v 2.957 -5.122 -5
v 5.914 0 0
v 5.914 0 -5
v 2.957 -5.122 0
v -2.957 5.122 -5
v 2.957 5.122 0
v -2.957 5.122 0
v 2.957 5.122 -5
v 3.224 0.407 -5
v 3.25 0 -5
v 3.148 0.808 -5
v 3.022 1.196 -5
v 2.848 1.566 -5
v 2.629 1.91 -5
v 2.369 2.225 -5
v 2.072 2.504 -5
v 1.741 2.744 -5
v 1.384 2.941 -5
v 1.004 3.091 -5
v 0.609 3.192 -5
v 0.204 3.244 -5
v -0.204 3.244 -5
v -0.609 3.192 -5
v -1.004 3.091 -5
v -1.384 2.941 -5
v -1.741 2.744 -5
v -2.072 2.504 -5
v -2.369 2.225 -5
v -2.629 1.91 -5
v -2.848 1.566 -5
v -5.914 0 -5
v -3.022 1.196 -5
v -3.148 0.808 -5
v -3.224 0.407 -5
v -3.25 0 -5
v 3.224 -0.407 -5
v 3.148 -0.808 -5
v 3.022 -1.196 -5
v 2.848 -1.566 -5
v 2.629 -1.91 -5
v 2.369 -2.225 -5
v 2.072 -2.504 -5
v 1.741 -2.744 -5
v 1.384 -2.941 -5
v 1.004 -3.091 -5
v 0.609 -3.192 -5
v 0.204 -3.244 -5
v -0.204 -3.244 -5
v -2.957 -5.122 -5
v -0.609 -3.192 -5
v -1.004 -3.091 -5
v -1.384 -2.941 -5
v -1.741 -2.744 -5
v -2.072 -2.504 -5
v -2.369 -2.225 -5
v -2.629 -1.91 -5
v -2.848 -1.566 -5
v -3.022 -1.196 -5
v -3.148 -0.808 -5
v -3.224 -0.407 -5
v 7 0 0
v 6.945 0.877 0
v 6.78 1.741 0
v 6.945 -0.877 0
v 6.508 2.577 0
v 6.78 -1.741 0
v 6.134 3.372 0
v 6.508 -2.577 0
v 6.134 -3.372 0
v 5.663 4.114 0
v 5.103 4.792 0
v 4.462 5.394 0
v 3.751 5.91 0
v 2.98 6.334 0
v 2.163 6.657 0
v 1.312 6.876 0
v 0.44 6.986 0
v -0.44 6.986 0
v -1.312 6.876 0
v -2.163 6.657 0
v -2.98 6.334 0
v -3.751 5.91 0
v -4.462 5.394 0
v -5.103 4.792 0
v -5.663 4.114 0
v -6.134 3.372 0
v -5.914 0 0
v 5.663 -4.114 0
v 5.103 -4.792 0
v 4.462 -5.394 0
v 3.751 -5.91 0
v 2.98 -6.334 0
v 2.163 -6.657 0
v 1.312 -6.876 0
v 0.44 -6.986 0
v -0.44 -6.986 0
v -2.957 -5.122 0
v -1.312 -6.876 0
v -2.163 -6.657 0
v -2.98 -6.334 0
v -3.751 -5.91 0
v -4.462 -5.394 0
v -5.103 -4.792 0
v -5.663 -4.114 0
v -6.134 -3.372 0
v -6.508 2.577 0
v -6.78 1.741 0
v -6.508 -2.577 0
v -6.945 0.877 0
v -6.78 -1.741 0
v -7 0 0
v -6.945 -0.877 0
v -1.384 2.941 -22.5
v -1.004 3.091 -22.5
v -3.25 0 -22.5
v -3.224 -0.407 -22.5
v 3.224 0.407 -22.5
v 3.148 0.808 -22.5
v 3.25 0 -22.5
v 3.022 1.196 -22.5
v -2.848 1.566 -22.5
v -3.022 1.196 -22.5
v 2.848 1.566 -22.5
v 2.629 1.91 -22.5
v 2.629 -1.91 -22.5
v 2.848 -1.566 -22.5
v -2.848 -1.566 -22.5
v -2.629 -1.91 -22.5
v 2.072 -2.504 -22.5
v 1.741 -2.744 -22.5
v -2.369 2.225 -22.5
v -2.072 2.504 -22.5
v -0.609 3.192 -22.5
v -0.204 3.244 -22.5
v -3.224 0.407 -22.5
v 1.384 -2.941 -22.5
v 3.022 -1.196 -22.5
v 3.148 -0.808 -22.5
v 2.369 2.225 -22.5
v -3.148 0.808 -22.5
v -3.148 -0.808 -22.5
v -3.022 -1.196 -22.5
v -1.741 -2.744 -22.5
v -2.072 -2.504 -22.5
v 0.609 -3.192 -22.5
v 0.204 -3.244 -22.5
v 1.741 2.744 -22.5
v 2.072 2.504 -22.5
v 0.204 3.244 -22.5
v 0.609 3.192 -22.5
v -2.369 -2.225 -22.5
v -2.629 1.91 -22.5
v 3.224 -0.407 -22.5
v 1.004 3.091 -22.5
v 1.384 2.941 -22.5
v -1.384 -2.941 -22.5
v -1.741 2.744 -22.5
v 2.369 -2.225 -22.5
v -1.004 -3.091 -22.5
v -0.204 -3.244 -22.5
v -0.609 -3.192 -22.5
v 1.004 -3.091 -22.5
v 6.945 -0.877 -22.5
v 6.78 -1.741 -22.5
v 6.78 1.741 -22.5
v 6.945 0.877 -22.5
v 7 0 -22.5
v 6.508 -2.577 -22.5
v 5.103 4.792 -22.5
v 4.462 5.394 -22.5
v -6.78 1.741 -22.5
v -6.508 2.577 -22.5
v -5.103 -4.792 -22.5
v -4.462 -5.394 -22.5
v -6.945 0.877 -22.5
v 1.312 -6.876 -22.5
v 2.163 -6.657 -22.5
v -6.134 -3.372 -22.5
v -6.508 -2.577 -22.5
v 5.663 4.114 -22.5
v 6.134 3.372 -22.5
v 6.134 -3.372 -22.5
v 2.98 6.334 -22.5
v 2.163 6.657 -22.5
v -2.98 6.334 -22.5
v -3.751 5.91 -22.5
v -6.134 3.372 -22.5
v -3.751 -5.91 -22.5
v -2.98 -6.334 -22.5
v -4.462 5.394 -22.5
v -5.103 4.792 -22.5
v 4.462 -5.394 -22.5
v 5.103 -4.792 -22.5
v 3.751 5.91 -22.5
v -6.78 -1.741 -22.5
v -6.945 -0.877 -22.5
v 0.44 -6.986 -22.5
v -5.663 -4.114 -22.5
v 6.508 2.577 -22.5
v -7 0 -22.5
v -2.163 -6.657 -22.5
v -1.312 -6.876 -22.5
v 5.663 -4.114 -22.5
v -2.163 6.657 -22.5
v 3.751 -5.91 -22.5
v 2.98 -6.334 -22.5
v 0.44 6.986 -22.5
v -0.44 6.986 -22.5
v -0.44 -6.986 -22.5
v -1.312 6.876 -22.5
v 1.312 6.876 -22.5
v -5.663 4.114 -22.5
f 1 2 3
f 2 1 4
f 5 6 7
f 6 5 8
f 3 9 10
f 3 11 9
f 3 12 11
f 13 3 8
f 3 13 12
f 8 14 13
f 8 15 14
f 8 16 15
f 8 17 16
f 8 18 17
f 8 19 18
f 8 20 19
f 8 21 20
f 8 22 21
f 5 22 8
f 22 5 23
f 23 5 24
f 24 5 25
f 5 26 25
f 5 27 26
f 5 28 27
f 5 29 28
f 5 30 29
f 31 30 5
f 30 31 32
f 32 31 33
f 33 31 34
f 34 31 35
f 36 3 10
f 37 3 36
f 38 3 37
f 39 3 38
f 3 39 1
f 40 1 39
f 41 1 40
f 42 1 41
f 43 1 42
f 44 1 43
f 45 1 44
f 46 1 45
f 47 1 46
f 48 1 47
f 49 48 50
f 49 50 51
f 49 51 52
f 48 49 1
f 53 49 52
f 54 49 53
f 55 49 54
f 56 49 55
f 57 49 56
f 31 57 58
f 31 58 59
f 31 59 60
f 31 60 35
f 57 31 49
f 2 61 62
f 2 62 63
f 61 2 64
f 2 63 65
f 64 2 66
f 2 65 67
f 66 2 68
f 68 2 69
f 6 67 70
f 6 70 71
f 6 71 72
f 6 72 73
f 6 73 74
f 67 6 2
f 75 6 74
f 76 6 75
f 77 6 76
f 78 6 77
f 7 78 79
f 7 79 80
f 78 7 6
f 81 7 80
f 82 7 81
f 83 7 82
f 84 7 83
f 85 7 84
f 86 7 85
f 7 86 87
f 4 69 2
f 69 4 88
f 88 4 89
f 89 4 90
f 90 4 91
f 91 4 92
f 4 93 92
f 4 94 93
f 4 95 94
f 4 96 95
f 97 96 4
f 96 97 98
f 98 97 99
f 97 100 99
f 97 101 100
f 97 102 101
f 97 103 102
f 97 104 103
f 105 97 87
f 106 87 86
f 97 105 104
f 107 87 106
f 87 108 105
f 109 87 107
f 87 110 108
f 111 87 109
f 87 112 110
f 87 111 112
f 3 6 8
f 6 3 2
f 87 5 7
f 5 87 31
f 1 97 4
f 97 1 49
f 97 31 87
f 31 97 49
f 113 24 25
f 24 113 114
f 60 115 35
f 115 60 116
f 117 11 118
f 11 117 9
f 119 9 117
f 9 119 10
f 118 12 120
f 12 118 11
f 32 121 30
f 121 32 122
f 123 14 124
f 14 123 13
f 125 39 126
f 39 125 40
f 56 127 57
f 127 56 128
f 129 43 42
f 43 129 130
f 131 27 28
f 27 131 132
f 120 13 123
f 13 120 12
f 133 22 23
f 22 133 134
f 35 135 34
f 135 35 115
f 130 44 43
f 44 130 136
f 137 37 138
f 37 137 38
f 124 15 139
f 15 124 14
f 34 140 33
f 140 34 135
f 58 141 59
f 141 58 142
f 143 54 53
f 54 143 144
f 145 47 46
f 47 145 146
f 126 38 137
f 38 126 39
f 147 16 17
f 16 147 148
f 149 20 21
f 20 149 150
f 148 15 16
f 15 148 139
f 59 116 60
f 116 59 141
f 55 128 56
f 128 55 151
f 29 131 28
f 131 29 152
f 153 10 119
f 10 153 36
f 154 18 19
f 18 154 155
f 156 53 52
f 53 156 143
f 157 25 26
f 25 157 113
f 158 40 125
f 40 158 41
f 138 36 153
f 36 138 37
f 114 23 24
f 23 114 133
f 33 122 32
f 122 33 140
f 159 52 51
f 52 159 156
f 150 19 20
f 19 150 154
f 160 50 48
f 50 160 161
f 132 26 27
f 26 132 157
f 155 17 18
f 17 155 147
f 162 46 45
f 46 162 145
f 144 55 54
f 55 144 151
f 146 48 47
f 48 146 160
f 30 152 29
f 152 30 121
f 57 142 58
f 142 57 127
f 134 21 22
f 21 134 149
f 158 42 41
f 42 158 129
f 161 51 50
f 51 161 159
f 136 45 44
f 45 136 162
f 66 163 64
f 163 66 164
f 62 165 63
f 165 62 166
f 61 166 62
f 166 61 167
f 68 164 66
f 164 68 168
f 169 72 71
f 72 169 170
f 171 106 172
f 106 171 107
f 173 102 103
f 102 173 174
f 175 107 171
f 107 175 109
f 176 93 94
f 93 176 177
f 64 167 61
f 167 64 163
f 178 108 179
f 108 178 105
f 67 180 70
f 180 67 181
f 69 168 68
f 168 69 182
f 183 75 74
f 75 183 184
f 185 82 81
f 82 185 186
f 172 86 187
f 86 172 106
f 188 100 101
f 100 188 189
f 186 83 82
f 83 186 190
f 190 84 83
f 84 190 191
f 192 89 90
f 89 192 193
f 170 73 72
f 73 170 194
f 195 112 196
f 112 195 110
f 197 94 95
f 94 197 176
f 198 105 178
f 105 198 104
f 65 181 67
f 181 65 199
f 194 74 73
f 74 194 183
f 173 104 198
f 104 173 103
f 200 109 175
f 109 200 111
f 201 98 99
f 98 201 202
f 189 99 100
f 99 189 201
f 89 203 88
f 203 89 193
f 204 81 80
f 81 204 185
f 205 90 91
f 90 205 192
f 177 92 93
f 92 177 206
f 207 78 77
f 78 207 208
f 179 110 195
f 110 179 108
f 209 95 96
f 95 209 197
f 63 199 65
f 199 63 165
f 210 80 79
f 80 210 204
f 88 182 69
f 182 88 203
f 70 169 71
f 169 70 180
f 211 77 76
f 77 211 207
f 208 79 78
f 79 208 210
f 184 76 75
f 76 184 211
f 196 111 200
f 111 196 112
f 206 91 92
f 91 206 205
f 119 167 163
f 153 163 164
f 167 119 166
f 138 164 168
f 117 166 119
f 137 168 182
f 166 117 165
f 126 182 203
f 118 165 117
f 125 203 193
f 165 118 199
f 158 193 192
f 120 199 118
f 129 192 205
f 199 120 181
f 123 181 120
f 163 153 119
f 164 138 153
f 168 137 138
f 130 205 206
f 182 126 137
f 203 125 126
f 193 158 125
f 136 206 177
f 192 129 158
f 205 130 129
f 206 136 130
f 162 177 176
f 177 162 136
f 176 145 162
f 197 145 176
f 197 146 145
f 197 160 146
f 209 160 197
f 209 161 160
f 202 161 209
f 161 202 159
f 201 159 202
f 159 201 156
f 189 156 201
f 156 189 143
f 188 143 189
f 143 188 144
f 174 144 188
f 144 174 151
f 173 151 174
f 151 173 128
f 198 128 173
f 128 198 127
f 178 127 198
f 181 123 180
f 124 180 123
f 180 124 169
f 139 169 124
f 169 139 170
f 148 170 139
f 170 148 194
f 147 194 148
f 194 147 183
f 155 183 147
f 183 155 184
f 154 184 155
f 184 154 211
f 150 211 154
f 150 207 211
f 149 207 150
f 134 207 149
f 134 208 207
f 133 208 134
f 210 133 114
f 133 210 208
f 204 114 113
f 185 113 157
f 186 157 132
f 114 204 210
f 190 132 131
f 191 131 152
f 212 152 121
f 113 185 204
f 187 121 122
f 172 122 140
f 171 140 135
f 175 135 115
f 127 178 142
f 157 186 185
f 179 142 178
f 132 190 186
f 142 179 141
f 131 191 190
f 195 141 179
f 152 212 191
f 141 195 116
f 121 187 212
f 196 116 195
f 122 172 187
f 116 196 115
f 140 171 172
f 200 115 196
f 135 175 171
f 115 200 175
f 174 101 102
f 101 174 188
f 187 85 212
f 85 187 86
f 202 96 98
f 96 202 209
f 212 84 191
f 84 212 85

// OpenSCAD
$fn = 50;


difference() {
	union() {
		translate(v = [0, 0, -22.5000000000]) {
			cylinder(h = 22.5000000000, r = 7.0000000000);
		}
	}
	union() {
		translate(v = [0, 0, 0]) {
			rotate(a = [0, 0, 0]) {
				difference() {
					union() {
						translate(v = [0, 0, -5]) {
							linear_extrude(height = 5) {
								polygon(points = [[5.9142500000, 0.0000000000], [2.9571250000, 5.1218907443], [-2.9571250000, 5.1218907443], [-5.9142500000, 0.0000000000], [-2.9571250000, -5.1218907443], [2.9571250000, -5.1218907443]]);
							}
						}
					}
					union();
				}
			}
		}
		#translate(v = [0, 0, -100.0000000000]) {
			cylinder(h = 200, r = 3.2500000000);
		}
	}
}
